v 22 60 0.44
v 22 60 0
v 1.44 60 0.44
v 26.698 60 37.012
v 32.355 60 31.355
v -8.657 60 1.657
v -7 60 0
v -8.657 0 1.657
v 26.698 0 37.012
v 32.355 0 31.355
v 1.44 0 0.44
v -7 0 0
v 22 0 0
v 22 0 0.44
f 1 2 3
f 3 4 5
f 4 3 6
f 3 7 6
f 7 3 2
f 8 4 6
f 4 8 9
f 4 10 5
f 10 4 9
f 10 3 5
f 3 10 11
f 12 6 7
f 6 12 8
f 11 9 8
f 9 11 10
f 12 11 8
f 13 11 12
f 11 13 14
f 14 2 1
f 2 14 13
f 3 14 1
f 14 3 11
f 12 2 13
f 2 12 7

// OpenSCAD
l=50;
w=60;
t=8;
a=45;


difference(){
    union(){
        translate([-3,0,-t/2])
        rotate([0,-a,0])
        cube([l,w,t]);
        
        translate([-3,0,0])
        cube([l/2,w,0.44]);
    }    
    
    translate([-l,-w/2,-l])
    cube([l*2,w*2,l]);
}
